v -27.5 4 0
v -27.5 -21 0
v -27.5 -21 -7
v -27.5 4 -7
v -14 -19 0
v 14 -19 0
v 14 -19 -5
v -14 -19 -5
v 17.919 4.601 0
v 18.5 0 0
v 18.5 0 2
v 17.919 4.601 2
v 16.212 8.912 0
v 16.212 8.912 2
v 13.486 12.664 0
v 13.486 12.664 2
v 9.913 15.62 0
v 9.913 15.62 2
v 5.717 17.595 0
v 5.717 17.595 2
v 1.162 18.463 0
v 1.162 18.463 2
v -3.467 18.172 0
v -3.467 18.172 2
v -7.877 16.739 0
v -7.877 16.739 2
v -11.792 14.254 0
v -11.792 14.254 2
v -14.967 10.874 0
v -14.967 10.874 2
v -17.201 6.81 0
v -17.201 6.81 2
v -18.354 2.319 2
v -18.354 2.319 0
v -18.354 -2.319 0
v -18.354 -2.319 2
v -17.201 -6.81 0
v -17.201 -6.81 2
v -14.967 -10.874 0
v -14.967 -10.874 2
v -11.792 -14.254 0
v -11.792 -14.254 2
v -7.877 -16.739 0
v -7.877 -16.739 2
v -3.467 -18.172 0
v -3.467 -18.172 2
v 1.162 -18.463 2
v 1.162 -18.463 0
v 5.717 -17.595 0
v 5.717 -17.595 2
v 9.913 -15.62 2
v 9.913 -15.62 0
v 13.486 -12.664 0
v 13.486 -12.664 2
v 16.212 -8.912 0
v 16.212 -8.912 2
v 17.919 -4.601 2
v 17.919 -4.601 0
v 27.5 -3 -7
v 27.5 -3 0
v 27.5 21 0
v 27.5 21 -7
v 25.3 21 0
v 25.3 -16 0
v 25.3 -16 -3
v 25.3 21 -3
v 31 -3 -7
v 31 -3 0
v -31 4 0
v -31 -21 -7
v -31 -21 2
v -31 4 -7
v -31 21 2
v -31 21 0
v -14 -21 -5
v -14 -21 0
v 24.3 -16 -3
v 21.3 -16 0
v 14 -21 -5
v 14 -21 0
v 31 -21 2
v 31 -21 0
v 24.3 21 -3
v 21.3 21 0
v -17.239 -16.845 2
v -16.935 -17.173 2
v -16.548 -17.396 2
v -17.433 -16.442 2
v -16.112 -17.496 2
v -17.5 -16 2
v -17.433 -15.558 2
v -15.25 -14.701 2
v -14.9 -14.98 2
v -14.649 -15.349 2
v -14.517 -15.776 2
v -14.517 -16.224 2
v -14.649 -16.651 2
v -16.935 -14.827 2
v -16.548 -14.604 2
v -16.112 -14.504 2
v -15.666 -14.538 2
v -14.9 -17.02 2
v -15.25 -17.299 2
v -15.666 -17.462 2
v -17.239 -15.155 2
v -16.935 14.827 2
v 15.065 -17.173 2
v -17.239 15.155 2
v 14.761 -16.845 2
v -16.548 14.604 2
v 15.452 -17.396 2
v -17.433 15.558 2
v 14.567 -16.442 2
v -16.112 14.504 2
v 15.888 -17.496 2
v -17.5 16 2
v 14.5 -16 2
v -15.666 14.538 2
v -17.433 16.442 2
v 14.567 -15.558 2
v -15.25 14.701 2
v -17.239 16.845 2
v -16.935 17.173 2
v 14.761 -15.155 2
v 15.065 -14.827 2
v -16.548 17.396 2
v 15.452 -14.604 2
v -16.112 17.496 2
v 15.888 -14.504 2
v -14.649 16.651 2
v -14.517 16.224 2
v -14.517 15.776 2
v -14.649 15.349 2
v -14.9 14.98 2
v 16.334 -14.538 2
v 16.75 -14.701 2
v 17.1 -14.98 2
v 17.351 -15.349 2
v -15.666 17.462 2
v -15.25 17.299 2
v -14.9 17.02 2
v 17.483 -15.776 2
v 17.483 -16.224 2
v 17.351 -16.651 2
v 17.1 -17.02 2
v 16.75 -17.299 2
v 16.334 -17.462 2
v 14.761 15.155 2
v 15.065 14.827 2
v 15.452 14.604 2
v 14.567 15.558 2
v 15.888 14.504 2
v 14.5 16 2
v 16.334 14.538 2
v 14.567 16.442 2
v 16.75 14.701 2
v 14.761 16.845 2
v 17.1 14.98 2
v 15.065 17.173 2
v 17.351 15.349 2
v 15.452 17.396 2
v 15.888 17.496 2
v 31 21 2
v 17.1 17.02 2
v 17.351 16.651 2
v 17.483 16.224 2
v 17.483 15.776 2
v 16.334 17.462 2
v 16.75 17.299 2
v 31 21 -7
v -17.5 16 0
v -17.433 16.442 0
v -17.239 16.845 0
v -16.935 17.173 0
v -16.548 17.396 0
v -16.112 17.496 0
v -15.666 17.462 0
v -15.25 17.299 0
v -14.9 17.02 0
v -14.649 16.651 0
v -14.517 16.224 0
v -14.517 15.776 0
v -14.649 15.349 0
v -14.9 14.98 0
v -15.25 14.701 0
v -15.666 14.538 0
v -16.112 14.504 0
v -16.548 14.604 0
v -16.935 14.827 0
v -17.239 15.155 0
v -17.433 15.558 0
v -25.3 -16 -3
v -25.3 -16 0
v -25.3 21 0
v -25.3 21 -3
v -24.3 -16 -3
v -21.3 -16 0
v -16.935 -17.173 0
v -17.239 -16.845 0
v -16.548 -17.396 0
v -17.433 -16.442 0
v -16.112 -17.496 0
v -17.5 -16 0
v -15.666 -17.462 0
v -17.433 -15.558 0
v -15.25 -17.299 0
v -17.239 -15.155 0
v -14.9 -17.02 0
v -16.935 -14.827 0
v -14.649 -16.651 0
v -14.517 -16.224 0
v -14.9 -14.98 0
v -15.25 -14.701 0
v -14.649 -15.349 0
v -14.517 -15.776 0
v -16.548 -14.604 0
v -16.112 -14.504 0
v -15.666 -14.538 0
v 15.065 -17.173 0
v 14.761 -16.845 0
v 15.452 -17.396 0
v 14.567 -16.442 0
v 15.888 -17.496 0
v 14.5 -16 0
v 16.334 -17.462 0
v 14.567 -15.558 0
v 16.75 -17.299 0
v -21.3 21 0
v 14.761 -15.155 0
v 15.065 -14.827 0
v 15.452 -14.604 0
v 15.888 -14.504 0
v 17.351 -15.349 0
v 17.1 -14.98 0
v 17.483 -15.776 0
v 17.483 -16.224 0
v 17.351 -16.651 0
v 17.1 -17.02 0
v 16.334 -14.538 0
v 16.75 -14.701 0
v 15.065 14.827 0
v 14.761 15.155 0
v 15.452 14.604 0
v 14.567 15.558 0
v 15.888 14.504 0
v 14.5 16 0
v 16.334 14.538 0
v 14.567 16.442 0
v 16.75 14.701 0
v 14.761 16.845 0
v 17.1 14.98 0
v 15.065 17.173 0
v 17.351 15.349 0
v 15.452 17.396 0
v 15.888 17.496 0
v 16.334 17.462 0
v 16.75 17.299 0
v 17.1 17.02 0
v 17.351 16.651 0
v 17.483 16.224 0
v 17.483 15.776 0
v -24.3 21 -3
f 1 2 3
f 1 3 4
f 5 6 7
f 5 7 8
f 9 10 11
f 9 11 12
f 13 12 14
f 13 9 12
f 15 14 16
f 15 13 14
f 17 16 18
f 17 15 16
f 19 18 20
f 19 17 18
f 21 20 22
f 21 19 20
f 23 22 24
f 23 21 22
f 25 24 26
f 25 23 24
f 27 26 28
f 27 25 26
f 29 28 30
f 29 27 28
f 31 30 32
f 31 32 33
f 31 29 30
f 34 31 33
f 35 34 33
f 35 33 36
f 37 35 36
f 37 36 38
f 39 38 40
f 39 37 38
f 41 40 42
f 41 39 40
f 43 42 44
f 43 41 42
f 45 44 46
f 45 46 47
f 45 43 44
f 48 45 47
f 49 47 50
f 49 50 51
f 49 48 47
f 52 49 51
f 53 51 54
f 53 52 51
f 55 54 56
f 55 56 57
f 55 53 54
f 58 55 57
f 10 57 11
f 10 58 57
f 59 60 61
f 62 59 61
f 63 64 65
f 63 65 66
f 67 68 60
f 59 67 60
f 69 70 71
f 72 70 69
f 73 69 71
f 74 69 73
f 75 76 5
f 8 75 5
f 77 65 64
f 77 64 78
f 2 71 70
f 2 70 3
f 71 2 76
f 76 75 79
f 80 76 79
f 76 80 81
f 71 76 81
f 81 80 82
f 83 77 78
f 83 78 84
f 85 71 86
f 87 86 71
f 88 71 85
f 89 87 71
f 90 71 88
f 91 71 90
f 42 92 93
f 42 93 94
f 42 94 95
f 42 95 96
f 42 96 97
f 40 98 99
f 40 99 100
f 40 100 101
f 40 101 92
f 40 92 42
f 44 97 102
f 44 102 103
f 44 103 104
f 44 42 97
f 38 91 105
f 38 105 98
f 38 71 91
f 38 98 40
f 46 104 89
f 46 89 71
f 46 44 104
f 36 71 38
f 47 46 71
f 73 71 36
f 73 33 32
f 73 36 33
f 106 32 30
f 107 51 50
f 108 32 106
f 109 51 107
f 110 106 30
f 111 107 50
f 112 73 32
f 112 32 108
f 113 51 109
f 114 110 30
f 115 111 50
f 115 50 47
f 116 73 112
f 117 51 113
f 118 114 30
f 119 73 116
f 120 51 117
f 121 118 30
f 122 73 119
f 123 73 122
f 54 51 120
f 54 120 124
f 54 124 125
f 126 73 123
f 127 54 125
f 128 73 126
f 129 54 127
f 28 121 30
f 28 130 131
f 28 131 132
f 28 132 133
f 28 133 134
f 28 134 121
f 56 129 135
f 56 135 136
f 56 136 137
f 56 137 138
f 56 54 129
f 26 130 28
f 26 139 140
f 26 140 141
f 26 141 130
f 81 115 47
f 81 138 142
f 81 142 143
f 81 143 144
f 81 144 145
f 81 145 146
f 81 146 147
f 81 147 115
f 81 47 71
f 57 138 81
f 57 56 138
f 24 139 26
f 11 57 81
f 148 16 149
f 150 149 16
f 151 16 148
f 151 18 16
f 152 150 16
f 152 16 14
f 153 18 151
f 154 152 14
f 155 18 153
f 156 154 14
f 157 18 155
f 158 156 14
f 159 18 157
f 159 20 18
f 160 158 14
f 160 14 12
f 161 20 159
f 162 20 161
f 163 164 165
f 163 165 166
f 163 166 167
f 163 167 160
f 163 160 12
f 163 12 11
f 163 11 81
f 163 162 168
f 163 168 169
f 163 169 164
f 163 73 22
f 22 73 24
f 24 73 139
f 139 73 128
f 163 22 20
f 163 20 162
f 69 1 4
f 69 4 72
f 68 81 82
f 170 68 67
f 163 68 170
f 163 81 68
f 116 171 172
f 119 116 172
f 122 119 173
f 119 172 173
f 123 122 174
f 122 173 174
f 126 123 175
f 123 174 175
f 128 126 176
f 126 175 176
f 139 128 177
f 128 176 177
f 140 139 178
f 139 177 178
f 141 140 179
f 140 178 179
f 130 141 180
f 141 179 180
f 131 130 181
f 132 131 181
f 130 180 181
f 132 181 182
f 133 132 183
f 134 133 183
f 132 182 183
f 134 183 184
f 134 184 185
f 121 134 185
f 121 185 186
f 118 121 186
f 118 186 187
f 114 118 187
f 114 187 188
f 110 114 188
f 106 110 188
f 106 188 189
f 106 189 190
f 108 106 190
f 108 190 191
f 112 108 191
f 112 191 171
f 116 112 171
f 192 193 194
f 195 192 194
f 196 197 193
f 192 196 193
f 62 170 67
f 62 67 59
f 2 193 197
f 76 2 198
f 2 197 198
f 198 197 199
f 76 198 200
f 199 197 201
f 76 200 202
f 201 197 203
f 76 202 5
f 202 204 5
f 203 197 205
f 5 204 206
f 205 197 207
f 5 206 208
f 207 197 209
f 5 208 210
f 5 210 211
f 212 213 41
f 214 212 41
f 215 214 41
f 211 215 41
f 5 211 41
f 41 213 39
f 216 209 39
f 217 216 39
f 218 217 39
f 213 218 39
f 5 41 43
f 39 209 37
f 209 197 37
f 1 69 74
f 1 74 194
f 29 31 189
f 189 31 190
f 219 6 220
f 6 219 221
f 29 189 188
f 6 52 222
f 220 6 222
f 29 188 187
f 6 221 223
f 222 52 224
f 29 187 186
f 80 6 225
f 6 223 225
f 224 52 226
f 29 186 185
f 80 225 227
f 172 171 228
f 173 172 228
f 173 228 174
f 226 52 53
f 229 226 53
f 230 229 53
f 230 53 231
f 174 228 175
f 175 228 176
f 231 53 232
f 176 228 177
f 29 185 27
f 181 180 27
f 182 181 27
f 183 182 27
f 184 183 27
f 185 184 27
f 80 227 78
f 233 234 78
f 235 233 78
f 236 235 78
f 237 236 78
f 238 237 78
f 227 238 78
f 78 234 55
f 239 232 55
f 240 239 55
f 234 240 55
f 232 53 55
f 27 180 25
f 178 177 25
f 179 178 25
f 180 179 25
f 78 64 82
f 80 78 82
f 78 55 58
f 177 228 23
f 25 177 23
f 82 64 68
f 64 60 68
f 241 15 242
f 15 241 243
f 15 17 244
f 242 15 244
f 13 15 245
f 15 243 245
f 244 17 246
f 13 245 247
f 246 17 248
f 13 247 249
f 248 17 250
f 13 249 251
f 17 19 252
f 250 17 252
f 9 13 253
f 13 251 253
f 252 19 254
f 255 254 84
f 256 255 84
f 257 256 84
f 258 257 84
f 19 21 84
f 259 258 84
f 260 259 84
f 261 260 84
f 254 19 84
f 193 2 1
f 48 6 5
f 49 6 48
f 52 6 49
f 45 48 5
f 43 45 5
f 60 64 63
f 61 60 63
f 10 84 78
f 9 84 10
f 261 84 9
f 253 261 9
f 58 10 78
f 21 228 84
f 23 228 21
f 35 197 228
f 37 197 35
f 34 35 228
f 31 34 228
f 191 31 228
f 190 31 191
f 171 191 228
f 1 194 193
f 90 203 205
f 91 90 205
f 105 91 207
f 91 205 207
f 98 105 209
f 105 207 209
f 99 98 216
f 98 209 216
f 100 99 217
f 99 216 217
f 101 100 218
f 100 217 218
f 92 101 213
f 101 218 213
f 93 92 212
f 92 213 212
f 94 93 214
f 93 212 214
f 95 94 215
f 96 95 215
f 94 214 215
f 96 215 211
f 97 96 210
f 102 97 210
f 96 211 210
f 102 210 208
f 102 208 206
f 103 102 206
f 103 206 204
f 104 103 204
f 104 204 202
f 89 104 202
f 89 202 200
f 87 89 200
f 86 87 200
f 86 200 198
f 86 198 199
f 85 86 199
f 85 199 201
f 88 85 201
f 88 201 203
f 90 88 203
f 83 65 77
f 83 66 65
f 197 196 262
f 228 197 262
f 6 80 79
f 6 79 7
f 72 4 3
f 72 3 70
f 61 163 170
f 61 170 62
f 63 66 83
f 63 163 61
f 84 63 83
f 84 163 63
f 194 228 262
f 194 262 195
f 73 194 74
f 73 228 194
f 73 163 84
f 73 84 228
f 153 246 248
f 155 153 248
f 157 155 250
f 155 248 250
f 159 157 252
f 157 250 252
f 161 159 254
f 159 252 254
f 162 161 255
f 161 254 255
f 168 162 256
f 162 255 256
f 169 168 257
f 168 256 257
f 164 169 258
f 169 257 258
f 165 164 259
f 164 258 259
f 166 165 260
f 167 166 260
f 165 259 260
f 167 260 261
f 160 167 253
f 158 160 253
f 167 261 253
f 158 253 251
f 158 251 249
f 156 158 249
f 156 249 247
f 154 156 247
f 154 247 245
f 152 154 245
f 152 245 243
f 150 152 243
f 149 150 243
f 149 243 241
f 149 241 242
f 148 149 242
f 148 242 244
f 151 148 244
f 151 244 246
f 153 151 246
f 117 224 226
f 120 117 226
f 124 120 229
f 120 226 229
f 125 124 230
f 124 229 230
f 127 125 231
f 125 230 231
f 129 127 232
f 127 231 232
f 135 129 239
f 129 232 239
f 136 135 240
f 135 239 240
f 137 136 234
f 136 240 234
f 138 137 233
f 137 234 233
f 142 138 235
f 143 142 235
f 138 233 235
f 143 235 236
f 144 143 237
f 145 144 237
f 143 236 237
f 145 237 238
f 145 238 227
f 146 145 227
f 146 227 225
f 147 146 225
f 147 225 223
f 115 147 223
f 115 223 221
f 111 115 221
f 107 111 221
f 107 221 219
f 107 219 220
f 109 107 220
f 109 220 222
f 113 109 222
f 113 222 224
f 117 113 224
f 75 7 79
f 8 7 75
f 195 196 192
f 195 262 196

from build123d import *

# Parameters (mm, degrees)
SKETCH_1_W      = 62
SKETCH_1_H      = 42
SKETCH_1_R      = 18.5
EXTRUDE_1_DEPTH = 2
F_3_0MM_1_D     = 3
SKETCH_4_W      = 3.5
SKETCH_4_H      = 24
SKETCH_4_H_2    = 25
EXTRUDE_2_DEPTH = 7
SKETCH_5_W      = 28
SKETCH_5_H      = 2
EXTRUDE_3_DEPTH = 5
SKETCH_7_W      = 4
SKETCH_7_H      = 37
EXTRUDE_4_DEPTH = 3
CHAMFER_1_SIZE  = 3


with BuildPart() as part:
    # 스케치1 → 보스-돌출1 (new body)
    with BuildSketch(Plane.XY):
        Rectangle(SKETCH_1_W, SKETCH_1_H)
        Circle(SKETCH_1_R, mode=Mode.SUBTRACT)
    extrude(amount=EXTRUDE_1_DEPTH)

    # Ø3.0mm 맞춤핀 구멍1 (through all)
    with Locations(Plane(origin=(-16, 16, 2), x_dir=(1, 0, 0), z_dir=(0, 0, 1))):
        with Locations((0, 0), (32, 0), (32, -32), (0, -32)):
            Hole(F_3_0MM_1_D / 2)

    # 스케치4 → 보스-돌출2 (add)
    with BuildSketch(Plane(origin=(0, 0, 0), x_dir=(-1, 0, 0), z_dir=(0, 0, -1))):
        with Locations((-29.25, 9)):
            Rectangle(SKETCH_4_W, SKETCH_4_H)
        with Locations((29.25, -8.5)):
            Rectangle(SKETCH_4_W, SKETCH_4_H_2)
    extrude(amount=EXTRUDE_2_DEPTH)

    # 스케치5 → 보스-돌출3 (add)
    with BuildSketch(Plane(origin=(0, 0, 0), x_dir=(-1, 0, 0), z_dir=(0, 0, -1))):
        with Locations((0, -20)):
            Rectangle(SKETCH_5_W, SKETCH_5_H)
    extrude(amount=EXTRUDE_3_DEPTH)

    # 스케치7 → 보스-돌출4 (add)
    with BuildSketch(Plane(origin=(0, 0, 0), x_dir=(-1, 0, 0), z_dir=(0, 0, -1))):
        with Locations((-23.3, 2.5)):
            Rectangle(SKETCH_7_W, SKETCH_7_H)
        with Locations((23.3, 2.5)):
            Rectangle(SKETCH_7_W, SKETCH_7_H)
    extrude(amount=EXTRUDE_4_DEPTH)

    # 모따기1
    chamfer_1_edges = [part.edges().sort_by_distance(p)[0] for p in [
        (-21.3, 2.5, -3),
        (21.3, 2.5, -3),
    ]]
    chamfer(chamfer_1_edges, length=CHAMFER_1_SIZE - 0.0001)  # a hair under: the kernel refuses the full size


solid = part.part
